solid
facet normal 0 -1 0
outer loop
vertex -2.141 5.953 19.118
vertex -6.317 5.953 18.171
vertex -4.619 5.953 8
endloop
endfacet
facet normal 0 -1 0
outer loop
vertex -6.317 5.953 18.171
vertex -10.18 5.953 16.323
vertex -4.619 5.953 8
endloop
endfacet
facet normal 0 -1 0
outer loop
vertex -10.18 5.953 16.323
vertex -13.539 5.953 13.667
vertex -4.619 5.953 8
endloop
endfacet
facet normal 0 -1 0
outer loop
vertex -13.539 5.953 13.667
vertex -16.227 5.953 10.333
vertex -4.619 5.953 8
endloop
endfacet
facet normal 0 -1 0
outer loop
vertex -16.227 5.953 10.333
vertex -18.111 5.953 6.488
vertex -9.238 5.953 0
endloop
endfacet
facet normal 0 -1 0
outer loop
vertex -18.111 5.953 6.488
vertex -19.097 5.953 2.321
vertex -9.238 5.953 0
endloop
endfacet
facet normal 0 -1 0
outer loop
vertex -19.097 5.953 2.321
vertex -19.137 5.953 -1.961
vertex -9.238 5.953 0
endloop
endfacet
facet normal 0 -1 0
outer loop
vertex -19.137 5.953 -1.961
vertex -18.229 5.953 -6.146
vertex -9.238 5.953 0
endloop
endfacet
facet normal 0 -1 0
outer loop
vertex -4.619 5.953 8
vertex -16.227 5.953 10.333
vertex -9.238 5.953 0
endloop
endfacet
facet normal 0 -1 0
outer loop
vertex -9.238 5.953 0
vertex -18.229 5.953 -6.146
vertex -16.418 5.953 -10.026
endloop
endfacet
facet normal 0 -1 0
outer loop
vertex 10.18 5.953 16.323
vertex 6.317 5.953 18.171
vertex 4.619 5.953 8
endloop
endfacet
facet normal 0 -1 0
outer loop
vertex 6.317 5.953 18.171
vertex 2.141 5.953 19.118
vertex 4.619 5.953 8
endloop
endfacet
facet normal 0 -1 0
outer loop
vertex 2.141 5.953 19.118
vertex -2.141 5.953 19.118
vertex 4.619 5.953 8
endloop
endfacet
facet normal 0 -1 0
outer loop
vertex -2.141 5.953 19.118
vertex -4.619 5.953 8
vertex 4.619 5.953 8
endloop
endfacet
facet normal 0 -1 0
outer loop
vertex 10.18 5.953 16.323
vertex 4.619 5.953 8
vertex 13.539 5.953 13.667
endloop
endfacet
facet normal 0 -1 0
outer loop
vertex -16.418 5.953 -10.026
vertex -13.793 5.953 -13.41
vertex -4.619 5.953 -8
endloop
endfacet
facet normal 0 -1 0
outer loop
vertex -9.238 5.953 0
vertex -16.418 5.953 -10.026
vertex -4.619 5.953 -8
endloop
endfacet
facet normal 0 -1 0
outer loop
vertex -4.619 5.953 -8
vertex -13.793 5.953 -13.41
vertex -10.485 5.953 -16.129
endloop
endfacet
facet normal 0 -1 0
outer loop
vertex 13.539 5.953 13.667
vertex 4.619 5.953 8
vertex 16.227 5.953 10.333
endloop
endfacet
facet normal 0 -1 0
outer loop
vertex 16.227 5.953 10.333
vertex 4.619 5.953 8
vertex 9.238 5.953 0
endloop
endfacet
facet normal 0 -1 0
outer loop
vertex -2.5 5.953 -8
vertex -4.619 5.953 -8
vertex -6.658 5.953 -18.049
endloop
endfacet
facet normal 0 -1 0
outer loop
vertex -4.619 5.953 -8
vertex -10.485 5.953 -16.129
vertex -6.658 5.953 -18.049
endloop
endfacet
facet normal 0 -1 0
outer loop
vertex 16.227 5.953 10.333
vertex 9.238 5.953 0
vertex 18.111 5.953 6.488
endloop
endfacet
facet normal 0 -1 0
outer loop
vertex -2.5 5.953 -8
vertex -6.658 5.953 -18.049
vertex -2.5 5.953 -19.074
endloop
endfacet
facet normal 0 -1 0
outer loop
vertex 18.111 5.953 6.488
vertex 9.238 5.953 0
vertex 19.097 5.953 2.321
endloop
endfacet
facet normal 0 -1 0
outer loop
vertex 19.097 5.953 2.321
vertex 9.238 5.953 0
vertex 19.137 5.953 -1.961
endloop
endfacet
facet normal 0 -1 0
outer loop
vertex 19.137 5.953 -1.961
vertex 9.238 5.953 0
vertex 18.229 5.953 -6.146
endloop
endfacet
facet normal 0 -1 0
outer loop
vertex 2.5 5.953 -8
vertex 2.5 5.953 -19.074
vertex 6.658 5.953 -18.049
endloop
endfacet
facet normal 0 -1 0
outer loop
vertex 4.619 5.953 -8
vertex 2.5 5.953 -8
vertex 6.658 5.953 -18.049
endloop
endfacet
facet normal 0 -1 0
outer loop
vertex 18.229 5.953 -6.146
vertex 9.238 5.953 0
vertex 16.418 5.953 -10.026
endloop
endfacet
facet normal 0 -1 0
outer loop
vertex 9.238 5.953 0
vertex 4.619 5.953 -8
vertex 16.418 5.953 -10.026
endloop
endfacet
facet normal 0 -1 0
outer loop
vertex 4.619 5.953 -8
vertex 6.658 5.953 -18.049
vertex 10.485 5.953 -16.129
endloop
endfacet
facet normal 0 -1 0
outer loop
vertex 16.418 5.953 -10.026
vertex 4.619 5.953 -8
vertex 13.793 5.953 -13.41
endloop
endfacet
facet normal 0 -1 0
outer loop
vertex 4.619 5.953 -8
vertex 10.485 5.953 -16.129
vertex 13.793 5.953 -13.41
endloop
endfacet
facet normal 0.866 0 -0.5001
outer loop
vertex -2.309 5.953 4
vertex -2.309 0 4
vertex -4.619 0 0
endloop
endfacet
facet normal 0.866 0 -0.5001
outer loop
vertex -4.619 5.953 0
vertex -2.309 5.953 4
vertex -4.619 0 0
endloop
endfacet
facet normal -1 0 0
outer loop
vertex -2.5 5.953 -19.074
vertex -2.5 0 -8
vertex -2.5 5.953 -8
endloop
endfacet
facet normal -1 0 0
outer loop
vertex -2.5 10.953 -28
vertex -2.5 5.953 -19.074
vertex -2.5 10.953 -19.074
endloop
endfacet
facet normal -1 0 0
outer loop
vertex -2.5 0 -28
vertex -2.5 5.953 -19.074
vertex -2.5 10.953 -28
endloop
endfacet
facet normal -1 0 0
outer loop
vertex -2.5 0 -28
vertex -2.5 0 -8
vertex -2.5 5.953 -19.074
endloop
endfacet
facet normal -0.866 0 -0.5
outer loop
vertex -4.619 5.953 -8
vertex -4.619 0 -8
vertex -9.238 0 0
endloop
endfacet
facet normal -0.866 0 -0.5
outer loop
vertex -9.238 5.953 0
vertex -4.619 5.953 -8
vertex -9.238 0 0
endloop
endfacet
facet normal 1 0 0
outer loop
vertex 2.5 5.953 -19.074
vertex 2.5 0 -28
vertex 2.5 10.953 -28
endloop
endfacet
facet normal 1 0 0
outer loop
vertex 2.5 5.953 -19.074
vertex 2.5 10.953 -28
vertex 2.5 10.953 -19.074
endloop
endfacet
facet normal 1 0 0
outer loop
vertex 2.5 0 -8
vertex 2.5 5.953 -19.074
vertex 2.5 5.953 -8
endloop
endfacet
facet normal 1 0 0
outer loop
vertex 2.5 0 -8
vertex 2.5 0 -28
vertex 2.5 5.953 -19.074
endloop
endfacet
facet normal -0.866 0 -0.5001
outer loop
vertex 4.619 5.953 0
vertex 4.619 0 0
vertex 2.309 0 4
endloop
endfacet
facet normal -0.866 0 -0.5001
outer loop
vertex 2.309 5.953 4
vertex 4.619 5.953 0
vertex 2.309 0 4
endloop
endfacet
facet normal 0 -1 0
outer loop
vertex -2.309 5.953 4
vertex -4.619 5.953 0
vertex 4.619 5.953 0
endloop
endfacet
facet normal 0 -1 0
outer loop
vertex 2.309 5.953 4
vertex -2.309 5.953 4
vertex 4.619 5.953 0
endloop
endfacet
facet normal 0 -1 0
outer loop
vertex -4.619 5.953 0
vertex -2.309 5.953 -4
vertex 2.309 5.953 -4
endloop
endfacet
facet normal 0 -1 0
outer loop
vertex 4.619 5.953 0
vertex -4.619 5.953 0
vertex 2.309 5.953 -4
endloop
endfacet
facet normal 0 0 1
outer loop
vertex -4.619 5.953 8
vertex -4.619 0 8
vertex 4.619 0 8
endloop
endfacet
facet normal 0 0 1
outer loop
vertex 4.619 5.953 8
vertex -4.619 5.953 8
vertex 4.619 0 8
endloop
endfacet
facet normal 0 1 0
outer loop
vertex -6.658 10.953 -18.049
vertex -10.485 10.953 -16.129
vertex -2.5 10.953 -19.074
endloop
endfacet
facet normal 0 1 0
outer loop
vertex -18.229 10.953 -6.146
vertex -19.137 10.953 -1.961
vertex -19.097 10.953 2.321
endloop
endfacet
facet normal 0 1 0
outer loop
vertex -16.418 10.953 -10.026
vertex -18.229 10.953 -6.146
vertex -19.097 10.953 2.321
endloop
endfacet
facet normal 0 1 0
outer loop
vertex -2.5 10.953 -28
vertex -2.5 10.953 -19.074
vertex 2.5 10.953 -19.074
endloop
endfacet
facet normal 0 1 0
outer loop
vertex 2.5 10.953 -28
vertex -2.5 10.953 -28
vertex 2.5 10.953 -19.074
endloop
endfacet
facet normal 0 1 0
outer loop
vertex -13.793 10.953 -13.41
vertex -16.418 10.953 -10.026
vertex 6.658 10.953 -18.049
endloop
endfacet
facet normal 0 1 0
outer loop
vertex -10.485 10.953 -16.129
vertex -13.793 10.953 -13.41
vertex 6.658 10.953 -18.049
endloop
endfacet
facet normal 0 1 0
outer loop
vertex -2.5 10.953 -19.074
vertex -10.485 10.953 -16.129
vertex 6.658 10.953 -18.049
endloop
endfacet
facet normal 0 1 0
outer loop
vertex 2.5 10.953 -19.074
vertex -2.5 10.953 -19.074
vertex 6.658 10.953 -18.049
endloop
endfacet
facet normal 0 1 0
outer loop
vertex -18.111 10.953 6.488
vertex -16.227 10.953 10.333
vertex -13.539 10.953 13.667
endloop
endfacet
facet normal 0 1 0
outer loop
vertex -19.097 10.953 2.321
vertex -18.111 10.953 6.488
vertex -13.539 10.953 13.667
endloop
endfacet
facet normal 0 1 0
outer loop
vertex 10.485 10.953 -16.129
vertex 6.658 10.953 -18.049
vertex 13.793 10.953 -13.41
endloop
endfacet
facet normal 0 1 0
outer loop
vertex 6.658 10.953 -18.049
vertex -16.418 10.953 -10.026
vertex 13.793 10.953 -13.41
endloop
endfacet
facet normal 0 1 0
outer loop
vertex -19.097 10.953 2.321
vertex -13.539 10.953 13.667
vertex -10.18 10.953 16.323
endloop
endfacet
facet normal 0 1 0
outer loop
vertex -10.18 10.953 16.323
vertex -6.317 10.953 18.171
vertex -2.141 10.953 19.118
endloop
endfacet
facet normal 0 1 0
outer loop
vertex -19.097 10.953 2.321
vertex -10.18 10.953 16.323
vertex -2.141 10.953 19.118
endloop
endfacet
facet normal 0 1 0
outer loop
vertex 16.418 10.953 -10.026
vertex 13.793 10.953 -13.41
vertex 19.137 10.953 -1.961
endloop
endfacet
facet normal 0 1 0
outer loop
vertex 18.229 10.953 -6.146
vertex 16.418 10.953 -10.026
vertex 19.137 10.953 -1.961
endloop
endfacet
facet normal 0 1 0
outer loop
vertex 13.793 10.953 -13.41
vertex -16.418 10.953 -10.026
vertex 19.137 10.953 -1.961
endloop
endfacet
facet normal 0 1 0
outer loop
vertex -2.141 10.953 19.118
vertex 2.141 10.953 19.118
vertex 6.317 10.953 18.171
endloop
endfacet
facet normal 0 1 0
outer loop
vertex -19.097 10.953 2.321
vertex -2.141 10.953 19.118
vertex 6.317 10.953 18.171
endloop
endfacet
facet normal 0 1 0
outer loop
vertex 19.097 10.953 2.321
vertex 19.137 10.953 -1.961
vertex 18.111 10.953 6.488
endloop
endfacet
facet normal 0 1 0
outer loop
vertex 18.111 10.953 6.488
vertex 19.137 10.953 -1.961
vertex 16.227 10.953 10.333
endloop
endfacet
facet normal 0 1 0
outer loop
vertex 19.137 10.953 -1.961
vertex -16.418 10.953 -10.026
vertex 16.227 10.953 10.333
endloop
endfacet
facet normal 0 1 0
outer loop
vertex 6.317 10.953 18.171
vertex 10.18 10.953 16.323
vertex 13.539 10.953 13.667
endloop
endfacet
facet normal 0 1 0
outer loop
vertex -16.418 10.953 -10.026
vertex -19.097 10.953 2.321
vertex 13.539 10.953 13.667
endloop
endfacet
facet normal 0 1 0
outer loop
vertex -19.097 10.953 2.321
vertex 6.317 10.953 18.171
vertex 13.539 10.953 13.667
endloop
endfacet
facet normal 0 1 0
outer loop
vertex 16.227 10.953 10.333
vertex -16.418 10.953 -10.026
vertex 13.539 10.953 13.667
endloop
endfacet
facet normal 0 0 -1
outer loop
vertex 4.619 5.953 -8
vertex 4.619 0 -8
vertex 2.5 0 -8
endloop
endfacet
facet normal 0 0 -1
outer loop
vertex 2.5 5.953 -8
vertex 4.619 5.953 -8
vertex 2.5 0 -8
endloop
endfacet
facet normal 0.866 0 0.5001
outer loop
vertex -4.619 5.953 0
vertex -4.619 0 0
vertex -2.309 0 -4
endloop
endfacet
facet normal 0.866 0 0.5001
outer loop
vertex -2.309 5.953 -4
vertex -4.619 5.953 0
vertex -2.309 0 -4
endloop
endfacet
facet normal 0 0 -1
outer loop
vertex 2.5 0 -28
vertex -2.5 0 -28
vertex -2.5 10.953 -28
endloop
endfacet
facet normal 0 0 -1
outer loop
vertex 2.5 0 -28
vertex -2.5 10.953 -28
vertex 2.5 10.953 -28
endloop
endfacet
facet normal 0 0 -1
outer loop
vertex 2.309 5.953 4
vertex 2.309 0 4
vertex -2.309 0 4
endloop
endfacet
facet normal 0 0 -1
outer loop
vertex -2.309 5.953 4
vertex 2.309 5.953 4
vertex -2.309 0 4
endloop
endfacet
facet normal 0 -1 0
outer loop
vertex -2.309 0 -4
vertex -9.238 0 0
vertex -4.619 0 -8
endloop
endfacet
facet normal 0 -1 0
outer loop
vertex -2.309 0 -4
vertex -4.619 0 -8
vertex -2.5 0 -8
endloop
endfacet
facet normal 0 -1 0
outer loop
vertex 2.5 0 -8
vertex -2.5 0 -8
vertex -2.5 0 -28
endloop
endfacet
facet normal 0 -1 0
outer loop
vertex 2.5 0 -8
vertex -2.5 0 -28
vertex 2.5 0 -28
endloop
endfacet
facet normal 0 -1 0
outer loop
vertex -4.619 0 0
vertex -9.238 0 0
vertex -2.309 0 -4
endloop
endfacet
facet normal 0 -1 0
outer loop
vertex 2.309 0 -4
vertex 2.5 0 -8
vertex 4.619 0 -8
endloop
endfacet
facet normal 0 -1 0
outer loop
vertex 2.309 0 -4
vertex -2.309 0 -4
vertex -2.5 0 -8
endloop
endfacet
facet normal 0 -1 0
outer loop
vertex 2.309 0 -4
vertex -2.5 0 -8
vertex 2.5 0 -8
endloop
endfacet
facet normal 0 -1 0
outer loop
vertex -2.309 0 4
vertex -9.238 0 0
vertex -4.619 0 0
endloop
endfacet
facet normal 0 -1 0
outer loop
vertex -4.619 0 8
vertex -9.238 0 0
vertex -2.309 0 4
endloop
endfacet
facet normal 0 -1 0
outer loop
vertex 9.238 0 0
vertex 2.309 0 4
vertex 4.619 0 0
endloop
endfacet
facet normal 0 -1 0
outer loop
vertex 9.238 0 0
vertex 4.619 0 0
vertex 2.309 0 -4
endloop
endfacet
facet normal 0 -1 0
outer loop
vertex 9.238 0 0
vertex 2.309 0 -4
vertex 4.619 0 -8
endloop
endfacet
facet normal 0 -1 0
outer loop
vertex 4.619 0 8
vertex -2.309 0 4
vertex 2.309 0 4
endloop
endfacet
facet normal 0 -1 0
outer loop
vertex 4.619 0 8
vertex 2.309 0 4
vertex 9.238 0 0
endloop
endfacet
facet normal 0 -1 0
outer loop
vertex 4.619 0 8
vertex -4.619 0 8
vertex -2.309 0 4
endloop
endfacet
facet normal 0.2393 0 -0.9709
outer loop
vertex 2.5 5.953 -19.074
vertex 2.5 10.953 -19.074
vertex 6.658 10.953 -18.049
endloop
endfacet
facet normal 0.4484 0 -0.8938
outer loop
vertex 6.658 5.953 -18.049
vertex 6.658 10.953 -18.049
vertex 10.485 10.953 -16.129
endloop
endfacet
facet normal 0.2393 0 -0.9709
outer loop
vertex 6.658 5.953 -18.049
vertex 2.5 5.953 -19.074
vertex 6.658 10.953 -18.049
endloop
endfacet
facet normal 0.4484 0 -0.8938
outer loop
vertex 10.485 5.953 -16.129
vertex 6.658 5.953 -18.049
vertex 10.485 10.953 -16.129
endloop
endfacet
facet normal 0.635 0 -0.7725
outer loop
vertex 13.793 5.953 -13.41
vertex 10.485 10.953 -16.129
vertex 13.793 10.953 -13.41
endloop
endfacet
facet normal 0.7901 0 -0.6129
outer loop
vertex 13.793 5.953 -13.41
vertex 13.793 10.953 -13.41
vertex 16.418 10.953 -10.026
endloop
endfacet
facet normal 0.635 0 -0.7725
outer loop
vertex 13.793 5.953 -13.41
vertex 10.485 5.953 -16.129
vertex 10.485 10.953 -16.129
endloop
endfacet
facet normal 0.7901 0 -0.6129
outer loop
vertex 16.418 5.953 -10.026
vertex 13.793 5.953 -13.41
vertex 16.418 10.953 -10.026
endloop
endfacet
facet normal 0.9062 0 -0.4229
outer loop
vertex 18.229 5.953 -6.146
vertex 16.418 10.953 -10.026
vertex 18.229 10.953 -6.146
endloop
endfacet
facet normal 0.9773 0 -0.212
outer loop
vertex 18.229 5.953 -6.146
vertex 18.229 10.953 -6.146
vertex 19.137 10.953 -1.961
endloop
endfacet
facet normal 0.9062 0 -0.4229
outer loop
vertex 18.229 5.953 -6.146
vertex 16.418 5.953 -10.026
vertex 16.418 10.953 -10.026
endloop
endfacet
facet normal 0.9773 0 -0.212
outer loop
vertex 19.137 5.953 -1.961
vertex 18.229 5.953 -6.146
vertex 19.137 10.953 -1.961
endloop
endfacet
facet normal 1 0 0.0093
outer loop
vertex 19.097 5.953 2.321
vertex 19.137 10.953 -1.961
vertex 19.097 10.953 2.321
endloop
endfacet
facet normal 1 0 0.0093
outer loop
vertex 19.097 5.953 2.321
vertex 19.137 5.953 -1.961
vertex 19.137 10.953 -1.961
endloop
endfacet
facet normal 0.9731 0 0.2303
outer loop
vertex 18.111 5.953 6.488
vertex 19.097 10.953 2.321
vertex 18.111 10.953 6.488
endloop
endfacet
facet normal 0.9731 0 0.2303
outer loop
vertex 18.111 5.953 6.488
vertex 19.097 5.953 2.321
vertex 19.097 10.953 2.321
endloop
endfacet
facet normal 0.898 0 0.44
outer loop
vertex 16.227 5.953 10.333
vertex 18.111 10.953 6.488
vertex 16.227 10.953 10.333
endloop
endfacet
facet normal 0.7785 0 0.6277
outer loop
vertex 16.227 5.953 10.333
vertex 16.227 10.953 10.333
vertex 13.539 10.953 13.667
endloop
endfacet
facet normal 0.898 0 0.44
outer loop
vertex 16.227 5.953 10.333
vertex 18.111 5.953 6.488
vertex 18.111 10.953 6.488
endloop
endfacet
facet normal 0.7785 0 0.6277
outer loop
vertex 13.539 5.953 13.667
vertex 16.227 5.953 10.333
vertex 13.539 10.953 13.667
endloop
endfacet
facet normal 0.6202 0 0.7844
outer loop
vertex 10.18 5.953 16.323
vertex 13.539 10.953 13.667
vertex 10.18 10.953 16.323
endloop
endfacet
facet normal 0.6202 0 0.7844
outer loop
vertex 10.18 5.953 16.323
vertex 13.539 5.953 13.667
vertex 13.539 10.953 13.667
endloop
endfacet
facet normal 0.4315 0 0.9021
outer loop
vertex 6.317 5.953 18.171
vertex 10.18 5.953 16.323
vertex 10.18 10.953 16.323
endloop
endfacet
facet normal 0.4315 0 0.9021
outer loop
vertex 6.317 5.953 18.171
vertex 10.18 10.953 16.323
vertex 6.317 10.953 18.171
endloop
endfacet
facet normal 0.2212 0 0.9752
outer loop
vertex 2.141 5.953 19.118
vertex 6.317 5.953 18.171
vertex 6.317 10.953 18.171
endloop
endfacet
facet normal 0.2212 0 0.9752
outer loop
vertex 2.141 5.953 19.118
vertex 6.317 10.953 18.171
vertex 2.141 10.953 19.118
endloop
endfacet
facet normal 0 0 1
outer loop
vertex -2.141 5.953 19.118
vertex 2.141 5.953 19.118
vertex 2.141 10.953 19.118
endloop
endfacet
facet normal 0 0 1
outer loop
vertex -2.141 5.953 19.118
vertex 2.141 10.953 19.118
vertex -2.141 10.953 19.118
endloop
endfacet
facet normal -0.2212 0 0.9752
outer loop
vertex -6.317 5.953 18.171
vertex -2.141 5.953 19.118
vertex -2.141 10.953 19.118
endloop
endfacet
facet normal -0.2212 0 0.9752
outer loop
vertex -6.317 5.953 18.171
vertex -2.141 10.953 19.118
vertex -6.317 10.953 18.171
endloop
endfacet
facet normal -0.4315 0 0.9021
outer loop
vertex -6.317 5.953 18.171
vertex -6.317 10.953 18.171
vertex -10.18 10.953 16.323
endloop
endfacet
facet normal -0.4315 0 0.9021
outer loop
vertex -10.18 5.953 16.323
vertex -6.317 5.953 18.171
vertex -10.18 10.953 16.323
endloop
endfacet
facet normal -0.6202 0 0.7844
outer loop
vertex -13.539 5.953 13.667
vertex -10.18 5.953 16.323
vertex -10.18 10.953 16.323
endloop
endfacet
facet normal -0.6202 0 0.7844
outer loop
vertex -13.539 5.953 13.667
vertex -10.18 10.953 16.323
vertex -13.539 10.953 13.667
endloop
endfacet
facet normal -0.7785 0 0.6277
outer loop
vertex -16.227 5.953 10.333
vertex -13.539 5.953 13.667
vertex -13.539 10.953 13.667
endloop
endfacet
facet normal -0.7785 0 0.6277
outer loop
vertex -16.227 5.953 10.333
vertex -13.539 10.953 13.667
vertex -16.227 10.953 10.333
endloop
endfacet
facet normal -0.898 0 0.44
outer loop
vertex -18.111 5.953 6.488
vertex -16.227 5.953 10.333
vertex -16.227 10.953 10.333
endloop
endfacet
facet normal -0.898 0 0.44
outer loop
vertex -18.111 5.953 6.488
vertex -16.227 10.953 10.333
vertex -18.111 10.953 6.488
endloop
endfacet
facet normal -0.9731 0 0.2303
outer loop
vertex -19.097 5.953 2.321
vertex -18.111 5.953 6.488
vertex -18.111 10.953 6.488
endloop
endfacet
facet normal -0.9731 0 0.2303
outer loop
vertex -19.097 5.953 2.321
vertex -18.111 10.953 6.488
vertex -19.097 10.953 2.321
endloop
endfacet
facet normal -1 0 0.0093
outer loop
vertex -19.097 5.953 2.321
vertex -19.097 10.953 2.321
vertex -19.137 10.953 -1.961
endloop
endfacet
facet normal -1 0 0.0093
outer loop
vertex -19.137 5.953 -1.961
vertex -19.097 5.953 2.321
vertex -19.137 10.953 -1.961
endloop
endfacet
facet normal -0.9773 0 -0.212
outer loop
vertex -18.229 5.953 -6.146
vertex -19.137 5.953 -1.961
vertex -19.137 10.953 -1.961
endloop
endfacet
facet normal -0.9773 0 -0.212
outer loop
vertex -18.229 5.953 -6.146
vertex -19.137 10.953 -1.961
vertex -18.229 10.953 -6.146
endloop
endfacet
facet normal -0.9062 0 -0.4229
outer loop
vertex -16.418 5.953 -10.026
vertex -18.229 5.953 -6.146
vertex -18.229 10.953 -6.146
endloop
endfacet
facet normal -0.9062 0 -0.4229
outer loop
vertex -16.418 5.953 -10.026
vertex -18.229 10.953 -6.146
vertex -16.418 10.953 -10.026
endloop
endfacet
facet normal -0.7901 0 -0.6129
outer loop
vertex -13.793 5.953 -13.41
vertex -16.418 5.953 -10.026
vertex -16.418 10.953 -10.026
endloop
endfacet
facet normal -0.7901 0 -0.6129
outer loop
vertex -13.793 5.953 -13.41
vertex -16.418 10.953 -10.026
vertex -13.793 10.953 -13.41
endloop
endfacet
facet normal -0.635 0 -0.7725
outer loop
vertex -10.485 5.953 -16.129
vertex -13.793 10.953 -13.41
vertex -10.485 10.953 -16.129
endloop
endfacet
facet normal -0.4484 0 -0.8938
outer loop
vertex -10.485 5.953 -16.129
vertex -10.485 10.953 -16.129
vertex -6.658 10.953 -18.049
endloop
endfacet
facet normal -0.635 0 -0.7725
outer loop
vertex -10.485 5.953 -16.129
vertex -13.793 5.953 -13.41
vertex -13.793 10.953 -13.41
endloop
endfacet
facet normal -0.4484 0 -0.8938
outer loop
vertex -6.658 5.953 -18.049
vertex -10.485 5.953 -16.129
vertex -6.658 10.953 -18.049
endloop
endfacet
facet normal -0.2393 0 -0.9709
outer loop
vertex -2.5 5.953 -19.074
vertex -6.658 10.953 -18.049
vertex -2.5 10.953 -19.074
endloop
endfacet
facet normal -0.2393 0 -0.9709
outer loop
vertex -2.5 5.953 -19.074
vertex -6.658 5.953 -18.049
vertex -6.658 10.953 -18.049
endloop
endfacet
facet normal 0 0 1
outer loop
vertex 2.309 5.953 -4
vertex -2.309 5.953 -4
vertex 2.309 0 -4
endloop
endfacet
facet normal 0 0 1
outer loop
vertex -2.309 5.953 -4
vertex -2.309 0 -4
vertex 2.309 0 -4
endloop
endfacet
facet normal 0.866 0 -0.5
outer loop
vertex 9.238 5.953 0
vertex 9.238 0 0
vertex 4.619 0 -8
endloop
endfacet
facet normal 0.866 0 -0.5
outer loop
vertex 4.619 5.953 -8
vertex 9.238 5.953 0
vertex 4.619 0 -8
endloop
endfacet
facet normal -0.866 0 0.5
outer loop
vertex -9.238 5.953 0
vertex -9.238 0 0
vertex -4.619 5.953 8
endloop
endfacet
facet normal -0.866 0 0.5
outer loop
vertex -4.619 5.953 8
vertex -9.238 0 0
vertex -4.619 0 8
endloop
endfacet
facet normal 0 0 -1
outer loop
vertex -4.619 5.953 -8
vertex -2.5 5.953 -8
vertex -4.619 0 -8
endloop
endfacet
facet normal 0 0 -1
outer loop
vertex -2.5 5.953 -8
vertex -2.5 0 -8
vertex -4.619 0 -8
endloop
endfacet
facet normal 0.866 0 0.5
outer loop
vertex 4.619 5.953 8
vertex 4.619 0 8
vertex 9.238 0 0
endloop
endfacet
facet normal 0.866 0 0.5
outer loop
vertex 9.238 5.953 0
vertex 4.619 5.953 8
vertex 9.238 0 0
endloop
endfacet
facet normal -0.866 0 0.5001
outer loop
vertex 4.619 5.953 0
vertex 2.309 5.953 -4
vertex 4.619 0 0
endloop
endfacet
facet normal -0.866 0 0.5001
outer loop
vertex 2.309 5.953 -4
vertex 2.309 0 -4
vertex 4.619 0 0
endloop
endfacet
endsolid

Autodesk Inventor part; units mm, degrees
ref_plane "YZ Plane" through (0, 0, 0) normal (1, 0, 0) x (0, 1, 0)
ref_plane "XZ Plane" through (0, 0, 0) normal (0, 1, 0) x (-1, 0, 0)
ref_plane "XY Plane" through (0, 0, 0) normal (0, 0, 1) x (1, 0, 0)
sketch "Sketch1" plane through (0, 0, 0) normal (0, 1, 0) x (-1, 0, 0)
  line L0 (2.3094, 4) -> (4.6188, 0)
  line L1 (4.6188, 0) -> (2.3094, -4)
  line L2 (2.3094, -4) -> (-2.3094, -4)
  line L3 (-2.3094, -4) -> (-4.6188, 0)
  line L4 (-4.6188, 0) -> (-2.3094, 4)
  line L5 (-2.3094, 4) -> (2.3094, 4)
  line L6 (4.6188, -8) -> (9.2376, 0)
  line L7 (9.2376, 0) -> (4.6188, 8)
  line L8 (4.6188, 8) -> (-4.6188, 8)
  line L9 (-4.6188, 8) -> (-9.2376, 0)
  line L10 (-9.2376, 0) -> (-4.6188, -8)
  line L11 (-4.6188, -8) -> (4.6188, -8)
  point P0 (0, 0)
  point P1 (0, 0)
  dimension "d1" = 8
  dimension "d2" = 4
extrude "Extrusion1" add sketch "Sketch1" along normal blind 5.9531
sketch "Sketch2" plane through (0, 5.9531, 0) normal (0, 1, 0) x (1, 0, 0)
  circle A0 centre (0, 0) radius 19.2376
  line L0 (4.6188, -8) -> (9.2376, 0) projected
  circle A1 centre (0, 0) radius 9.2376
  dimension "d5" = 10
extrude "Extrusion2" add sketch "Sketch2" along normal blind 5 contours A0 | A1 L0 | L0 A1
sketch "Sketch3" plane through (0, 0, 0) normal (0, -1, 0) x (1, 0, 0)
  line L0 (4.6188, -8) -> (-4.6188, -8) projected
  line L1 (0, -8) -> (2.5, -8)
  line L2 (0, -8) -> (-2.5, -8)
  line L3 (2.5, -8) -> (-2.5, -8)
  line L4 (-2.5, -8) -> (-2.5, -28)
  line L5 (-2.5, -28) -> (2.5, -28)
  line L6 (2.5, -28) -> (2.5, -8)
  point P0 (0, 0)
  dimension "d8" = 2.5
  dimension "d9" = 2.5
  dimension "d10" = 20
extrude "Extrusion3" add sketch "Sketch3" against normal up to surface (10.9531 mm away)
properties part number "wingnut"
